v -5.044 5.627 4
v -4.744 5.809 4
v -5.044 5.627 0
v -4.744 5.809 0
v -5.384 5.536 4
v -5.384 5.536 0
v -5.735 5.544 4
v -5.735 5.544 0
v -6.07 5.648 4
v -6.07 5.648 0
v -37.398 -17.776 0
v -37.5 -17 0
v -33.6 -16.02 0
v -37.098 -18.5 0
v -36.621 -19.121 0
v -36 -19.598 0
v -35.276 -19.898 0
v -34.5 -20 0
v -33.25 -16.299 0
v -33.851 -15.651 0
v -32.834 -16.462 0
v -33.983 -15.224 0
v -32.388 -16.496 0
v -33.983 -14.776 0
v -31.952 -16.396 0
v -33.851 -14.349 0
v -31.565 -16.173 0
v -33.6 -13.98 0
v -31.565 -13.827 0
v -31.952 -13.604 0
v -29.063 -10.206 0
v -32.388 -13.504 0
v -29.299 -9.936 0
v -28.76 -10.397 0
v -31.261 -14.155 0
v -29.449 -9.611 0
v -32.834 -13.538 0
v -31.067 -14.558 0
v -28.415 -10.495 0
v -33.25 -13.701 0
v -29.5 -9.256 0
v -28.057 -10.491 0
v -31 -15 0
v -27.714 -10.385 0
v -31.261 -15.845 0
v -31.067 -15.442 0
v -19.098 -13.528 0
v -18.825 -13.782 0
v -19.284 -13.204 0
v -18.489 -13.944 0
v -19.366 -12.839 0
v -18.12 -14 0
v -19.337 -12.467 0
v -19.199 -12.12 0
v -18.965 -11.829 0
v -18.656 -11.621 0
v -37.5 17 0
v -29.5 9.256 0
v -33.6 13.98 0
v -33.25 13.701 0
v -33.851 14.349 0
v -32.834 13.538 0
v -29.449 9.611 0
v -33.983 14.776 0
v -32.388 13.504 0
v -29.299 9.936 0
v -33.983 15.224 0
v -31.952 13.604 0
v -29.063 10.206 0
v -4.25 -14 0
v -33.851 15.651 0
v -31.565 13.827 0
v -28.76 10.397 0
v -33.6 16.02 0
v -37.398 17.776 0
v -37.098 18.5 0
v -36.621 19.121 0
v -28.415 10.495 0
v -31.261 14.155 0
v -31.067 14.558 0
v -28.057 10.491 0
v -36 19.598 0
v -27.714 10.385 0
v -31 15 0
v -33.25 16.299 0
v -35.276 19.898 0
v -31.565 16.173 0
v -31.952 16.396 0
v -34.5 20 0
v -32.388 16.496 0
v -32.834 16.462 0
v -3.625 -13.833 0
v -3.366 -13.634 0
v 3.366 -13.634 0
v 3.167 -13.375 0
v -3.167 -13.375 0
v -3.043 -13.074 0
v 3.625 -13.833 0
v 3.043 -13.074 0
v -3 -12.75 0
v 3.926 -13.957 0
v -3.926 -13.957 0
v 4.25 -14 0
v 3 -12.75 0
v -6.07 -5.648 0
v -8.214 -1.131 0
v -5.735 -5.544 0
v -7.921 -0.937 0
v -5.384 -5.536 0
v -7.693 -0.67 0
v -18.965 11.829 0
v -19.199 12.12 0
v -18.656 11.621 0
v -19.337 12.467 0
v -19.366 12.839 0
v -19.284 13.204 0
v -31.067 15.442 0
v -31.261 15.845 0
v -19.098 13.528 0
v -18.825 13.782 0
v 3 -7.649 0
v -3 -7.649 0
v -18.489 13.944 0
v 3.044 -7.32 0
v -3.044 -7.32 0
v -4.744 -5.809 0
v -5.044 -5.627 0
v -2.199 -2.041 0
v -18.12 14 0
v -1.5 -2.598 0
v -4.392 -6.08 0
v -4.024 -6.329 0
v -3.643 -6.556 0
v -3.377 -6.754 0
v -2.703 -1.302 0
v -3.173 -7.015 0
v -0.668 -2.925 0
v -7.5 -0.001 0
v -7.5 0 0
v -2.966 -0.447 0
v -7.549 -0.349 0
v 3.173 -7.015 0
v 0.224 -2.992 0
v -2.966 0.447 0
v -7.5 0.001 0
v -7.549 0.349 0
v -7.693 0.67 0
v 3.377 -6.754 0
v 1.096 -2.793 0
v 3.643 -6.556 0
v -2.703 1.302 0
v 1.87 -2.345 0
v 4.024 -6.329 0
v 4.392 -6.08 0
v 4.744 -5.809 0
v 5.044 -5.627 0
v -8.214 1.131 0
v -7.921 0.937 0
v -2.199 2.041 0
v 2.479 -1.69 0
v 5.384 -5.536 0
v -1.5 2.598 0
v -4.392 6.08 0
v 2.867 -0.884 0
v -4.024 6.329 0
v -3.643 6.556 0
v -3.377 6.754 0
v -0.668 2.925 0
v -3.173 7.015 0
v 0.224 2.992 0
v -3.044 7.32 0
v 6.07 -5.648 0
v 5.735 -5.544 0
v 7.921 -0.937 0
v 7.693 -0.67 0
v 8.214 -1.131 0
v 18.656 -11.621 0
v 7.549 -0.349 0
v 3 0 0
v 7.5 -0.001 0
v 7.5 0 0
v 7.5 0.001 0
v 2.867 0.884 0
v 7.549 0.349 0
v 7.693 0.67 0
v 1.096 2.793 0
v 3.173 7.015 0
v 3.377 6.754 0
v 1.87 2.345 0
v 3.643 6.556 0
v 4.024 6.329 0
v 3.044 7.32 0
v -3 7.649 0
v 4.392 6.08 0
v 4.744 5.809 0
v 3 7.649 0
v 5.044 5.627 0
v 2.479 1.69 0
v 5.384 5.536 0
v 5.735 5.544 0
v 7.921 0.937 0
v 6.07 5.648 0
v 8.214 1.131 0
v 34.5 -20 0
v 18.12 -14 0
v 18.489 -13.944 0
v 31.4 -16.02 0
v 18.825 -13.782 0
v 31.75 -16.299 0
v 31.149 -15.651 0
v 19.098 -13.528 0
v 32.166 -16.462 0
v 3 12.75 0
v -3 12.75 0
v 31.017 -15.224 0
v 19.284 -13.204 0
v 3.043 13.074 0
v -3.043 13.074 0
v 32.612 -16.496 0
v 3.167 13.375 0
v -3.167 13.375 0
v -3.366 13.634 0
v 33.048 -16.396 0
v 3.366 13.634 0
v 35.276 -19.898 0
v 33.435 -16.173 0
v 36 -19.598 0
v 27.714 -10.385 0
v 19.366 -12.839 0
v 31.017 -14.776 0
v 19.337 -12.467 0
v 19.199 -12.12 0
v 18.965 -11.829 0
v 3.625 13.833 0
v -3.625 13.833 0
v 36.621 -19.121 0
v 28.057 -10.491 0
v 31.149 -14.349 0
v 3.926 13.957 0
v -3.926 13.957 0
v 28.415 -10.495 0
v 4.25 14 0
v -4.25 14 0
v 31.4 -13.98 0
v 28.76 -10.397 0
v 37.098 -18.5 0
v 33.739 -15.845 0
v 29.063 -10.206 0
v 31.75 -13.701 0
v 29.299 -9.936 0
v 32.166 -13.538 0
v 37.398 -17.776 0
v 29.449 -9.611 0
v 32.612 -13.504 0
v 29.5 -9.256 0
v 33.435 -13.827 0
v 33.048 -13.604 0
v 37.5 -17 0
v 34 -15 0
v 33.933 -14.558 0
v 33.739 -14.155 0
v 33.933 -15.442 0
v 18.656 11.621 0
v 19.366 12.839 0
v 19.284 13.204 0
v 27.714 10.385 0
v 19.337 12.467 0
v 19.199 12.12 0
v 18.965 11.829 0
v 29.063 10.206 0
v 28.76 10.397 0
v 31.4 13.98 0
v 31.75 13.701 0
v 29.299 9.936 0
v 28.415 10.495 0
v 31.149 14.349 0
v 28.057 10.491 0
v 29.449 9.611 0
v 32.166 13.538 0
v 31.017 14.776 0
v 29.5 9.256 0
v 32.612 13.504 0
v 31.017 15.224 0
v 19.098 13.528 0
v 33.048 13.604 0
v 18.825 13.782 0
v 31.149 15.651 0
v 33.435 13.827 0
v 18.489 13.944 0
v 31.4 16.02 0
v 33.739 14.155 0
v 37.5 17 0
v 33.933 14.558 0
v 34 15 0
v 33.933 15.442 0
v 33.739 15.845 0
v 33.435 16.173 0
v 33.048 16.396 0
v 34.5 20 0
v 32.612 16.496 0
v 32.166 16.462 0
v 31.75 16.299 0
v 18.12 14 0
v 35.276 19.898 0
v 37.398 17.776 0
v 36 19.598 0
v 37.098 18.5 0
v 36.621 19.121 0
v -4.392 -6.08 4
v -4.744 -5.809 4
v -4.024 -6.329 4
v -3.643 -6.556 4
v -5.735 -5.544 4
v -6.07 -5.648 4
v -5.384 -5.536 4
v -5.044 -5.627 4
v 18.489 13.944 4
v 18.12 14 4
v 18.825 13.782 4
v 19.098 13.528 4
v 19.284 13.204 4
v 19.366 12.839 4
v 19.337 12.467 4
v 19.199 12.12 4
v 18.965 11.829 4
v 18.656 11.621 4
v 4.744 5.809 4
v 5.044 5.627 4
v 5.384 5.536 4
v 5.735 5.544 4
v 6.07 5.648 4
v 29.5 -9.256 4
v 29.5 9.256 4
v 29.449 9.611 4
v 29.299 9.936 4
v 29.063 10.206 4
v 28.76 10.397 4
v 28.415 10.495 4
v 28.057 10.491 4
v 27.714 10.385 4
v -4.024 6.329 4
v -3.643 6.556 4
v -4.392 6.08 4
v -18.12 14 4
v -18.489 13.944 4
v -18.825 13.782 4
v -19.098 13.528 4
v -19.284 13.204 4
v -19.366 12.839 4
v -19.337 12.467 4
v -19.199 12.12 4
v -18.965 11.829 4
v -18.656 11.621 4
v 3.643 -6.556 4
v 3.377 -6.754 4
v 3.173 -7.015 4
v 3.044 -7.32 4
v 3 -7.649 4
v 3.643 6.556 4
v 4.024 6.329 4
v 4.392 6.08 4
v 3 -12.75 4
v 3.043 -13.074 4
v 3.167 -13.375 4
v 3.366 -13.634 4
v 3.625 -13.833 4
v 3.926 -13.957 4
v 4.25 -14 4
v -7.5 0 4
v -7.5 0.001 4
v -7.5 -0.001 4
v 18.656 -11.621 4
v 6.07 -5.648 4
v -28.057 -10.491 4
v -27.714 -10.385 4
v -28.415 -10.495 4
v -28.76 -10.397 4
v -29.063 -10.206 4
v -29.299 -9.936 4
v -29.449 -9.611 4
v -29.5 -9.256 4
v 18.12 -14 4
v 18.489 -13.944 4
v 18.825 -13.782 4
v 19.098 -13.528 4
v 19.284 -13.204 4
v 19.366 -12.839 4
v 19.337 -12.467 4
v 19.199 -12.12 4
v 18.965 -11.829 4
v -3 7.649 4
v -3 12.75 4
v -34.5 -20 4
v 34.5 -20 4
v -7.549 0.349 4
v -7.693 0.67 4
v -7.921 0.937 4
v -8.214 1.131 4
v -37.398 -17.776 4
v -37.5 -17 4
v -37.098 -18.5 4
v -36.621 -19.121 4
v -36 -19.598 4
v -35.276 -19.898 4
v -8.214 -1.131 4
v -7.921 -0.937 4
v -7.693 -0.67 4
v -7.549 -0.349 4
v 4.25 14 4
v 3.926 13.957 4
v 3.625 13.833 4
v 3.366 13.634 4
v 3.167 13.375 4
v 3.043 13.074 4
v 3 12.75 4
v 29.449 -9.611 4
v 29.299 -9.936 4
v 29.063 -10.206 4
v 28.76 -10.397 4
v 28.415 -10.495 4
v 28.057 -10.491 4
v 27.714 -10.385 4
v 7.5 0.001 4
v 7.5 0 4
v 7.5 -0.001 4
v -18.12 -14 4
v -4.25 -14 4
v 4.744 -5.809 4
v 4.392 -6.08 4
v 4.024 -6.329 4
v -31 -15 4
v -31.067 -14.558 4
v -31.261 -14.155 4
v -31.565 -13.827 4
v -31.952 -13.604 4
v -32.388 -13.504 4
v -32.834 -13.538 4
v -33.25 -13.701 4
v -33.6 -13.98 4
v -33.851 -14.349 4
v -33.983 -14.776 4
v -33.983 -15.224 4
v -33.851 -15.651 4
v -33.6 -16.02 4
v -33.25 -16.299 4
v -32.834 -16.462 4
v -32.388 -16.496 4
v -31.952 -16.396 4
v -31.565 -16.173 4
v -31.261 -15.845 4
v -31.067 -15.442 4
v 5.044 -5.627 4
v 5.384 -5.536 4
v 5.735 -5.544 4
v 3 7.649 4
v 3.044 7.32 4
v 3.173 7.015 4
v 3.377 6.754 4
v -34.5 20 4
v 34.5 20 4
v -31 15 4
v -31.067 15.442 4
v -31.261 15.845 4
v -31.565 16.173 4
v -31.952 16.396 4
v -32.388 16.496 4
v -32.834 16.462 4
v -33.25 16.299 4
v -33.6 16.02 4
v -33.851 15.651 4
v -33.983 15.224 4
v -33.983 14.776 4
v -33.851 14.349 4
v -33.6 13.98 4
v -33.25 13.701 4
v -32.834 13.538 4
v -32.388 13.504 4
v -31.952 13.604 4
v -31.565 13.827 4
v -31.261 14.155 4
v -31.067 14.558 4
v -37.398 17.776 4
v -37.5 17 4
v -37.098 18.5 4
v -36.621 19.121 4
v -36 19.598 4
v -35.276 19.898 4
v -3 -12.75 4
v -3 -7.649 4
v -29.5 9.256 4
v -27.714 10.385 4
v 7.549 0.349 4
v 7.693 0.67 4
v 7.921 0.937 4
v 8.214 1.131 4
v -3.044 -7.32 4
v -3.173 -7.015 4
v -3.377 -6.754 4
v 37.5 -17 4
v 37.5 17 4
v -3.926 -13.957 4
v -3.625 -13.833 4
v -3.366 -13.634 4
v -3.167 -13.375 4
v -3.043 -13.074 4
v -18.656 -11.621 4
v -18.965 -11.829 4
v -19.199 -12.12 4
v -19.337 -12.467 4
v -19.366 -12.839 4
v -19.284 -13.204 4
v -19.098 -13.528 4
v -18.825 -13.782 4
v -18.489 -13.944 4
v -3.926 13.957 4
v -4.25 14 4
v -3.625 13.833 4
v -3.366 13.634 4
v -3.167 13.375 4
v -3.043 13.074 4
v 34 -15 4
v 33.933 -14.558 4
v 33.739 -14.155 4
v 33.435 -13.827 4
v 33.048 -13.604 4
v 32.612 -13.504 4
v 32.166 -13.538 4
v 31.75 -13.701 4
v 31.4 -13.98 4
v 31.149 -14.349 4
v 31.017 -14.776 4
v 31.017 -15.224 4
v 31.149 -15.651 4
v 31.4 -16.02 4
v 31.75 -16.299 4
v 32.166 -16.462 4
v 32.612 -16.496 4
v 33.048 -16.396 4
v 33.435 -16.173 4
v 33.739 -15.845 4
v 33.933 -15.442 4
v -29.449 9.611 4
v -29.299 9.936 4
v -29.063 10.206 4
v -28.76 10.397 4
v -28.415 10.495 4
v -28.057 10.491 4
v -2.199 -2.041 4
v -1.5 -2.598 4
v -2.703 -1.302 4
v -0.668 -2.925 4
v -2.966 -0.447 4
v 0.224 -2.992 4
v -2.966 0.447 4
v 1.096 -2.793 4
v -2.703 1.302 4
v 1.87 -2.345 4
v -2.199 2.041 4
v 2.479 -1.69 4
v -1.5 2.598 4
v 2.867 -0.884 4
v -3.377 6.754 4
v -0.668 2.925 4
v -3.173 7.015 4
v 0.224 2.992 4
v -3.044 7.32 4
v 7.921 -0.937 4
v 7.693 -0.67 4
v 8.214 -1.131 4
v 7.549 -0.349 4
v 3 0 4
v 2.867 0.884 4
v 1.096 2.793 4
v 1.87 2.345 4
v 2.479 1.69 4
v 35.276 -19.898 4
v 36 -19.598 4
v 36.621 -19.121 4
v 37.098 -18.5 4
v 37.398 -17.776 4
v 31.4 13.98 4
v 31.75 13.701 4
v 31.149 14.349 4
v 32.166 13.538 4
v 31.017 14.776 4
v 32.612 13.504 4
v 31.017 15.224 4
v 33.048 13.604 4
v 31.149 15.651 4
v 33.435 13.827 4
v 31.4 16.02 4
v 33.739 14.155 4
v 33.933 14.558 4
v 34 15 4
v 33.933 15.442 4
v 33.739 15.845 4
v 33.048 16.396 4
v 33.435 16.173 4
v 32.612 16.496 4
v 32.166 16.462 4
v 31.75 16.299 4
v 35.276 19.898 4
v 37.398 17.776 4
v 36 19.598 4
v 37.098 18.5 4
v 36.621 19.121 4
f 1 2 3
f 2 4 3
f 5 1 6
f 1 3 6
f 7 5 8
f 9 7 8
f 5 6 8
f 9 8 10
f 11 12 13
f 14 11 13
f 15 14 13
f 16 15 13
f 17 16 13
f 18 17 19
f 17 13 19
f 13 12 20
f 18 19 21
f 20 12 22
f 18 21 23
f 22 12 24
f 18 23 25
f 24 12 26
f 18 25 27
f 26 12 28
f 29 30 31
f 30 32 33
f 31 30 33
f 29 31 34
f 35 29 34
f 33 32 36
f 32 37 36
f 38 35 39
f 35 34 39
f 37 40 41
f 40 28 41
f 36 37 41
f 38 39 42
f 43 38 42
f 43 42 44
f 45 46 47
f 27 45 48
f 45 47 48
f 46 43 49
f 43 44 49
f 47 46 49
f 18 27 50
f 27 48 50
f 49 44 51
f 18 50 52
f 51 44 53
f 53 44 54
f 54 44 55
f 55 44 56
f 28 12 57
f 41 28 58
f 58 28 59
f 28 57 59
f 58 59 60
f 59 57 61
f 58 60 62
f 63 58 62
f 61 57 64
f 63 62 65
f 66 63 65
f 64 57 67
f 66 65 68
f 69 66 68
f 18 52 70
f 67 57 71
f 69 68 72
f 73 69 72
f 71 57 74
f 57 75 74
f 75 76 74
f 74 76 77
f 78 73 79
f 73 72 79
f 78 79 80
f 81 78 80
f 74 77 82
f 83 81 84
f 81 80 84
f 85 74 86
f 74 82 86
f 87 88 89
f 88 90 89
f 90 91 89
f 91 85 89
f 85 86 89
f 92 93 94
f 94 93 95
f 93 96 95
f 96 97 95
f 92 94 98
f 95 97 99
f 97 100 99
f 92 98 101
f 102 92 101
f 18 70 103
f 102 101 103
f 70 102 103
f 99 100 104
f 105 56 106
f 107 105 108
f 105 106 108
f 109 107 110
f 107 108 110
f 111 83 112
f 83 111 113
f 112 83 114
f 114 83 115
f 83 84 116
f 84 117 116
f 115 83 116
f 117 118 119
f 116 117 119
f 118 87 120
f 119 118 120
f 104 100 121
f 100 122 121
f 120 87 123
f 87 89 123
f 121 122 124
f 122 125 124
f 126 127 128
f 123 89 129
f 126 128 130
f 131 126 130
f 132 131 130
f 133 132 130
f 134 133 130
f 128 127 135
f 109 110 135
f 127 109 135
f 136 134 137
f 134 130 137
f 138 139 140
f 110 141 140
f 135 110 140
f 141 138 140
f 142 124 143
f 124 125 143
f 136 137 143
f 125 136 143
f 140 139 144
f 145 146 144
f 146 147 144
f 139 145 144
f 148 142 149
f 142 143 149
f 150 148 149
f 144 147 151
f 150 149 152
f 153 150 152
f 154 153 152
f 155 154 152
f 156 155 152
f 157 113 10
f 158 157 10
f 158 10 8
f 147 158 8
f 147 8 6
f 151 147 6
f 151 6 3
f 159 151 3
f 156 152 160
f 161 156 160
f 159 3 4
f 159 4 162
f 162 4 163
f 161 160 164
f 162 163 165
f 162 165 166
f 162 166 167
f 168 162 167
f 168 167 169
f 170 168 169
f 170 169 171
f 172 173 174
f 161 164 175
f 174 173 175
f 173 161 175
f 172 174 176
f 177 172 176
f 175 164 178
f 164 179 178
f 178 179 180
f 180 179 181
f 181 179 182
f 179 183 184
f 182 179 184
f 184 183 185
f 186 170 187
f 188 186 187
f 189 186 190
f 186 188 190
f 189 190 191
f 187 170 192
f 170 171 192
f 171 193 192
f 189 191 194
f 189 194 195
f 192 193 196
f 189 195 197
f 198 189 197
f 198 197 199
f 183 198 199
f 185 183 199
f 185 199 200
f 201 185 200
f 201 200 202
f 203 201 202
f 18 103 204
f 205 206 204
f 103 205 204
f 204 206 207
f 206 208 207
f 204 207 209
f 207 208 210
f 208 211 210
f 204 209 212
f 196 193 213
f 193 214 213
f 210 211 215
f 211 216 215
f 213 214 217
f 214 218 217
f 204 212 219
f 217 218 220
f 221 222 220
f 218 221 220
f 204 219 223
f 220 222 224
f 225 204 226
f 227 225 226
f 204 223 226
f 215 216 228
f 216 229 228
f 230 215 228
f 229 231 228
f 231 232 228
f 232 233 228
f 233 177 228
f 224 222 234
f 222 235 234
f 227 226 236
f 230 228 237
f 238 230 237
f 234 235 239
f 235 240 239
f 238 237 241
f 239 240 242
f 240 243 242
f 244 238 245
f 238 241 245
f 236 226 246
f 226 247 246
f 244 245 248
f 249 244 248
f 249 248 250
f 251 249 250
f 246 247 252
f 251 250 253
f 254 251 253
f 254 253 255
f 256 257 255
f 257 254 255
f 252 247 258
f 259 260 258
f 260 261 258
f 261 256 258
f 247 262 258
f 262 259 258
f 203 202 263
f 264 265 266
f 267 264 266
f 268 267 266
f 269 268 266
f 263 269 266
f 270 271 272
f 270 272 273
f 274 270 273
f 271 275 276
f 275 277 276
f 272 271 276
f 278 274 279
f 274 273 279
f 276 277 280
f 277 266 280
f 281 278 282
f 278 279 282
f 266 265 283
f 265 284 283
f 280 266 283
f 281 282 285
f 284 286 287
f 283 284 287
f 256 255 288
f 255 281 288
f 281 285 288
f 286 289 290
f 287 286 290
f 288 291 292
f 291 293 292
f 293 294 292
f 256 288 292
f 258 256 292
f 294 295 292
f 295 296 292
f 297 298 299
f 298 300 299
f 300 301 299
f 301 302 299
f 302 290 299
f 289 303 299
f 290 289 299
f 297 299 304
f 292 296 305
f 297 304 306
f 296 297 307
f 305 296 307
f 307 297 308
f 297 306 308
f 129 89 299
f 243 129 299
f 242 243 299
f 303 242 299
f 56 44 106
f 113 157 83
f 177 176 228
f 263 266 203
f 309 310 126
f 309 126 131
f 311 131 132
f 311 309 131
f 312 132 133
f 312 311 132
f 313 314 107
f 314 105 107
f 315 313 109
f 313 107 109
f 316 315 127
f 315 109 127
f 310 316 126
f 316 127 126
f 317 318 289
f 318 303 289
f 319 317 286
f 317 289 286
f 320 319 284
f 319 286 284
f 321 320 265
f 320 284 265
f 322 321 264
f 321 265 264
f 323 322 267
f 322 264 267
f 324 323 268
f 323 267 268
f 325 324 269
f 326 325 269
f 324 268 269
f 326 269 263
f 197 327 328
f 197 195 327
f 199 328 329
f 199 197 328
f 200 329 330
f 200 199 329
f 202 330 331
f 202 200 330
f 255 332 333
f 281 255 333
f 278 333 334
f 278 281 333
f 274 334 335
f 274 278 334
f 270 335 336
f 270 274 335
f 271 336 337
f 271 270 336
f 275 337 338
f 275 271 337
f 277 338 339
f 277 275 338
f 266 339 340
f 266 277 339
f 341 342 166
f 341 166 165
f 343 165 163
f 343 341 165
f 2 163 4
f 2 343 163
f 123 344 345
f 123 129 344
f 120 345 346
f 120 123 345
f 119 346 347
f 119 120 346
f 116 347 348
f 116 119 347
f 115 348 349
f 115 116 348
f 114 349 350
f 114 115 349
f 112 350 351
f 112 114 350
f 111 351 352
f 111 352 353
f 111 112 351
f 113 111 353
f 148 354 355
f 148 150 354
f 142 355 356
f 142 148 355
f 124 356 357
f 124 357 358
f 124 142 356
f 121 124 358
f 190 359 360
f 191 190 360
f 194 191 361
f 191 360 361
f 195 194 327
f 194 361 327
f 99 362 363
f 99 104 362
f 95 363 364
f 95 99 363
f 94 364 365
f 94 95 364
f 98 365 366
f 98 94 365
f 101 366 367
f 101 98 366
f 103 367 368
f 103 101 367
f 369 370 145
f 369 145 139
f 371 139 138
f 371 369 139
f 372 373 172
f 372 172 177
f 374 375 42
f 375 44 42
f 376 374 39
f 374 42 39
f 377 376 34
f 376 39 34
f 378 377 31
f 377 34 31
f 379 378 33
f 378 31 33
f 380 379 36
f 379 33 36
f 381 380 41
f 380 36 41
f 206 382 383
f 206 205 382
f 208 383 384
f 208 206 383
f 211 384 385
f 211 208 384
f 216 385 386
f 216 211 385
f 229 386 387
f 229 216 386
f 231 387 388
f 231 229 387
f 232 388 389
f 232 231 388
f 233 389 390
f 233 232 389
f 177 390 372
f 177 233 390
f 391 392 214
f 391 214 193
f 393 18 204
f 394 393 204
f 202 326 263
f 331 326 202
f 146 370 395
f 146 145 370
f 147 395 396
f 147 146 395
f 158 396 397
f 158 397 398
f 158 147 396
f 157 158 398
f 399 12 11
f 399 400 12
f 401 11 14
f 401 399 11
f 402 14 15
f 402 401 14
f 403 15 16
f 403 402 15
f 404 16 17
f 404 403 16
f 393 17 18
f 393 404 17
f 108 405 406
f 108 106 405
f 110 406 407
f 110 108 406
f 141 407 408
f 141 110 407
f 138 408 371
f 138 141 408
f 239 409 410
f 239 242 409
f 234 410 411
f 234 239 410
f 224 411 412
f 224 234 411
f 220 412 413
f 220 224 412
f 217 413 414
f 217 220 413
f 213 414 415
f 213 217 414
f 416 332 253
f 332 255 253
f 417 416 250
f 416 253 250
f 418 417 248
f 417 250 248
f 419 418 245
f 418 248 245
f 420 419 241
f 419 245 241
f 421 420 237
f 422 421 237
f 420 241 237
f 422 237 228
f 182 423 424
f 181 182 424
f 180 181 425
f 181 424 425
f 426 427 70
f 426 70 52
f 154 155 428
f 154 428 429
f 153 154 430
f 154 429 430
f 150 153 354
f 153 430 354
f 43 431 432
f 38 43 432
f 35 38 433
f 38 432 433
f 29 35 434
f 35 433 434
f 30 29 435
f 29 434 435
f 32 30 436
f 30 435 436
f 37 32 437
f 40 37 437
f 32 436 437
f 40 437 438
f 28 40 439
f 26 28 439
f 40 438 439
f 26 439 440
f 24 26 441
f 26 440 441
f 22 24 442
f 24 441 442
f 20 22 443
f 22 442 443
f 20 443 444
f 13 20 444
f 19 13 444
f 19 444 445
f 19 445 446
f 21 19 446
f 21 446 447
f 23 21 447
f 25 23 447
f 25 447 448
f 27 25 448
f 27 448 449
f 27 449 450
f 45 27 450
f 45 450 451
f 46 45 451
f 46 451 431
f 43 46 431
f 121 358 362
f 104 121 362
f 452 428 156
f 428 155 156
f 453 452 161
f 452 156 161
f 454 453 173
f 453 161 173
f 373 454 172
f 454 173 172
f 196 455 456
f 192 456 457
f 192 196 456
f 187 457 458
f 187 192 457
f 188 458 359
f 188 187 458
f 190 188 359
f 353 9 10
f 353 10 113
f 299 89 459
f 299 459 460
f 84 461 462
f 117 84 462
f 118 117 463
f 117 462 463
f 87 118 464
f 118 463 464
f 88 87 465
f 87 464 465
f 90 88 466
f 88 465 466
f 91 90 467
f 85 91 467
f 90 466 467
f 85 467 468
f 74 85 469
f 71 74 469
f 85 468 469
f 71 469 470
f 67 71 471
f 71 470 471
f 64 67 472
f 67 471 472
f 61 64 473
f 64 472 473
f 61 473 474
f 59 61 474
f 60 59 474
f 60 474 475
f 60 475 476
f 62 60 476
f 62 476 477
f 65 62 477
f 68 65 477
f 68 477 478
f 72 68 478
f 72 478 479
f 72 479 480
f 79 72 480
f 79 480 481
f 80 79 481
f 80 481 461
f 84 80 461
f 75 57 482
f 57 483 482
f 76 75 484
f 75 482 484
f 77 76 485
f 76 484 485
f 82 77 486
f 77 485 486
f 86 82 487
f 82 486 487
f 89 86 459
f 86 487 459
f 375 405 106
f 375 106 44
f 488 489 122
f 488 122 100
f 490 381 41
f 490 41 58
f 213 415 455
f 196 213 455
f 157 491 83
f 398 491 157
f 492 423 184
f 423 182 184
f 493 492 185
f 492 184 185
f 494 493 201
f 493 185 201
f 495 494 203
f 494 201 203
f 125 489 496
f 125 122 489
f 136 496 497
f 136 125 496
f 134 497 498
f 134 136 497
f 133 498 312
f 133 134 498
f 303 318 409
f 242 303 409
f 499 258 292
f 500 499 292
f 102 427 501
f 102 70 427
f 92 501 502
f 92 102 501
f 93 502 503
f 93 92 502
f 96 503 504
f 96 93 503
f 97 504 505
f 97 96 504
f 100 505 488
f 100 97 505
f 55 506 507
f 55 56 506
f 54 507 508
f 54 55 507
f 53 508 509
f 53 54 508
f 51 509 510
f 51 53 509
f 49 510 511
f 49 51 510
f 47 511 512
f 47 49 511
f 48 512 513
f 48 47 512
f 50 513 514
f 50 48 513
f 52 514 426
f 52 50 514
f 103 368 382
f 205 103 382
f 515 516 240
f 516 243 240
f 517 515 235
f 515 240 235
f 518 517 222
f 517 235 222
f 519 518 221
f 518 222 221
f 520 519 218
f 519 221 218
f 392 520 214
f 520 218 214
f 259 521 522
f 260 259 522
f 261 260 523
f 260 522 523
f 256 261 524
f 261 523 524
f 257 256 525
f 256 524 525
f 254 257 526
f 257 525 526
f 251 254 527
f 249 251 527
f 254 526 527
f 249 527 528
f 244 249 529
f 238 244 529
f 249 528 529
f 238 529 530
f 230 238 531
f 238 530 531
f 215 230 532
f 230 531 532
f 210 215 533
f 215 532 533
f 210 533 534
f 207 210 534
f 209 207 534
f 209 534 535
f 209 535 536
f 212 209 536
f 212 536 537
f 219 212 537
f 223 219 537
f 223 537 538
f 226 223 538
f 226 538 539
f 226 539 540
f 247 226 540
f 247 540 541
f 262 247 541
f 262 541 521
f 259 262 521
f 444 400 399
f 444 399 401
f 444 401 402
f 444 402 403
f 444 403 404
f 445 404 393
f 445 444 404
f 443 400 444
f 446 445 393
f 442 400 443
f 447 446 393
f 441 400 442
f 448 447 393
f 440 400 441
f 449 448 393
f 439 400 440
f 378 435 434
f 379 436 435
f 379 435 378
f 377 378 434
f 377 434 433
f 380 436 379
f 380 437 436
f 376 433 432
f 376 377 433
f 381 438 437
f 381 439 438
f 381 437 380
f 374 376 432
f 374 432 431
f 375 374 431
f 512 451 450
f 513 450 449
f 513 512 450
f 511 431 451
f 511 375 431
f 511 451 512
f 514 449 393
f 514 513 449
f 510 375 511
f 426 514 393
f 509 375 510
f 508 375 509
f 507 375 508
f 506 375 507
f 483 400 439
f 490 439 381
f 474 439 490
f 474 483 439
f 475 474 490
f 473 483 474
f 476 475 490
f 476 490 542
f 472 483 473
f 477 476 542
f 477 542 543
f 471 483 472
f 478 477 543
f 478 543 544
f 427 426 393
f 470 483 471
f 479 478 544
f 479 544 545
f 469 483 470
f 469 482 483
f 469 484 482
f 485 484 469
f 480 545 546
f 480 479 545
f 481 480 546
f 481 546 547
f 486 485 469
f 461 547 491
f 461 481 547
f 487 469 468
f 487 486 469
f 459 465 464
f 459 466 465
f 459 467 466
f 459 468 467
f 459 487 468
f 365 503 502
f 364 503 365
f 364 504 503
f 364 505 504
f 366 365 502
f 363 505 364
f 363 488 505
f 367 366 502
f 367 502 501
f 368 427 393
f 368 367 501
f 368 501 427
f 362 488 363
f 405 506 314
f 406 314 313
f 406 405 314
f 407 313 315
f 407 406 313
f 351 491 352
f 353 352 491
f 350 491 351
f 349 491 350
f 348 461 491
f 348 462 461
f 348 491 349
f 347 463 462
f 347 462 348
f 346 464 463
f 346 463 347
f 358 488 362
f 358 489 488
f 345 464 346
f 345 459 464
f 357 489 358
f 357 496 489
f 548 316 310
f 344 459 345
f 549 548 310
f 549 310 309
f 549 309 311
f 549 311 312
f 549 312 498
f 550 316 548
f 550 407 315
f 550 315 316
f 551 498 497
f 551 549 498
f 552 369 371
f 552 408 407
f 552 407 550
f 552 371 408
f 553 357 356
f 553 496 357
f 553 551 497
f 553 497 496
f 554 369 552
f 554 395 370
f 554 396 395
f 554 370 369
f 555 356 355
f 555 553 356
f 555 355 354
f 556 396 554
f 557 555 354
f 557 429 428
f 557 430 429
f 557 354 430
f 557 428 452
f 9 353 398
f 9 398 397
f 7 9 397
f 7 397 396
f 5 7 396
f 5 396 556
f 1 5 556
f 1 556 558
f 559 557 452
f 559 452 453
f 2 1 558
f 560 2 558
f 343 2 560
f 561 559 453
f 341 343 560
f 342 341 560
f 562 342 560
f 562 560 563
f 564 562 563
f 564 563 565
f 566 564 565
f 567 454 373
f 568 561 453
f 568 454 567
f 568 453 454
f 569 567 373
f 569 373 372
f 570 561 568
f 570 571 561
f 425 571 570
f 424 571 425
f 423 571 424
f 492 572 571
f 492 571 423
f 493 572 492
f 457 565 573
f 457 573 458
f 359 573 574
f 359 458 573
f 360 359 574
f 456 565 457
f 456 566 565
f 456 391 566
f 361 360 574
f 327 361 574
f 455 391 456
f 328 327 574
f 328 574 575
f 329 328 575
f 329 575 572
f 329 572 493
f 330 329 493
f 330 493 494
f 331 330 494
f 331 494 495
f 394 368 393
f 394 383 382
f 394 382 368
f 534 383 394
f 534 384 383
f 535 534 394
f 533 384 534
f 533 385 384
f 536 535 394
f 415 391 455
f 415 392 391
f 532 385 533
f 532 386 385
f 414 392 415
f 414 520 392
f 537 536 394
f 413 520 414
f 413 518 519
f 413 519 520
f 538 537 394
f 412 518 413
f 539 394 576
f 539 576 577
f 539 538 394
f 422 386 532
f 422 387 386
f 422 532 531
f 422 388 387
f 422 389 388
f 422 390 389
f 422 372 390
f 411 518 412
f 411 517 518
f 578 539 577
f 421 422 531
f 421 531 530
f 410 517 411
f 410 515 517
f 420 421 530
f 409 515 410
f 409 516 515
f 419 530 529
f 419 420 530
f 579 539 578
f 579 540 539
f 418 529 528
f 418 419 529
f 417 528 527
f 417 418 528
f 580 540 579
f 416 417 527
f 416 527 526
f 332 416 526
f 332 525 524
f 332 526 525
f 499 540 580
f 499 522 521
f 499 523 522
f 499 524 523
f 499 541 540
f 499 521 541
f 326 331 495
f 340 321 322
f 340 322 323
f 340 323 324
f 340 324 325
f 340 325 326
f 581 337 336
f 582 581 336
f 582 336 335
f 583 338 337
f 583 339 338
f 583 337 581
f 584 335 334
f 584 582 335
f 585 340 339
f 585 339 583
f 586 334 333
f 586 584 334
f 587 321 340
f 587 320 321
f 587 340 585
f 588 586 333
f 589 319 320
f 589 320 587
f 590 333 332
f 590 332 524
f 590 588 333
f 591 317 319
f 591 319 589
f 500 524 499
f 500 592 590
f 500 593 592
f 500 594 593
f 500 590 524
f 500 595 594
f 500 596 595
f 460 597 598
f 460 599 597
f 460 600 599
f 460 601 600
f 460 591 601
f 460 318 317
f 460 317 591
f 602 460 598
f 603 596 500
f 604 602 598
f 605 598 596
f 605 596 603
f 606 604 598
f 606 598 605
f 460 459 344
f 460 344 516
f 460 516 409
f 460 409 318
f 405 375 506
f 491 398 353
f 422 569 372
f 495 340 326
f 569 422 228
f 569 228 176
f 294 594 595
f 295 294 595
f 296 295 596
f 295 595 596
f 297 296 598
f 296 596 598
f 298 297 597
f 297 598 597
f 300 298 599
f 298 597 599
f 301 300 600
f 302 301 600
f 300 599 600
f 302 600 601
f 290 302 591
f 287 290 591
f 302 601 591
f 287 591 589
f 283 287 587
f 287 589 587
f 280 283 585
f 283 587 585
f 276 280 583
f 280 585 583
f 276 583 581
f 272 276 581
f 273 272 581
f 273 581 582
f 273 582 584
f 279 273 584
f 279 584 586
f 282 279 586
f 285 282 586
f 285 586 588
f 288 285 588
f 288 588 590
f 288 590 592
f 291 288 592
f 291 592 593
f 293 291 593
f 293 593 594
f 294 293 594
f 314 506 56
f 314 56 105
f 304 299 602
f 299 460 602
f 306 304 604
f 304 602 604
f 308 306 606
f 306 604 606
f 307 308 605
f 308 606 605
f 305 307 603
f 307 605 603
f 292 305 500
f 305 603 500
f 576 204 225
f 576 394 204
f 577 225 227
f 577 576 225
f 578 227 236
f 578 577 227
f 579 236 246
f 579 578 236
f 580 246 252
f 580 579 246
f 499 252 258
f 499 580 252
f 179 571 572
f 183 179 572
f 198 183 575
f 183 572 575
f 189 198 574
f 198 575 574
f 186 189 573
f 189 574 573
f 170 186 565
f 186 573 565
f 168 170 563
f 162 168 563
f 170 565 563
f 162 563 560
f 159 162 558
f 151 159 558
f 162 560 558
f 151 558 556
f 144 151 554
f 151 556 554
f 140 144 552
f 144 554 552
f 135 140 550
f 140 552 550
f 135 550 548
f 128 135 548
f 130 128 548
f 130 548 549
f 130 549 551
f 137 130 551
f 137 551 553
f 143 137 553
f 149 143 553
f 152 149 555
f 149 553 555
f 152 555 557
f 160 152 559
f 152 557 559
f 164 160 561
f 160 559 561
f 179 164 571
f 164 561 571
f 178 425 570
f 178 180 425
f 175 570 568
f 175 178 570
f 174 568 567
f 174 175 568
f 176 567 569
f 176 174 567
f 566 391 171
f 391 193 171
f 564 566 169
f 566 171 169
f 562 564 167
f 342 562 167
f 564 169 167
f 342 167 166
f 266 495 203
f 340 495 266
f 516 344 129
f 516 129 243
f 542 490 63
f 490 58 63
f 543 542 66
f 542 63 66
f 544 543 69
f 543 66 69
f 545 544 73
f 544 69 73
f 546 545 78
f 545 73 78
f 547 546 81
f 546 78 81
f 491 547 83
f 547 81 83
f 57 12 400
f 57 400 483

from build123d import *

# Parameters (mm, degrees)
SKETCH_1_W          = 75
SKETCH_1_H          = 40
EXTRUDE_1_DEPTH     = 4
SKETCH_3_R          = 3
CUT_EXTRUDE_1_DEPTH = 4
SKETCH_4_R          = 1.5
CUT_EXTRUDE_2_DEPTH = 10
FILLET_1_R          = 3
CUT_EXTRUDE_3_DEPTH = 10
EXTRUDE_2_DEPTH     = 4
FILLET_2_R          = 1.25


with BuildPart() as part:
    # 草图1 → 凸台-拉伸1 (new body)
    with BuildSketch(Plane.XY):
        Rectangle(SKETCH_1_W, SKETCH_1_H)
    extrude(amount=EXTRUDE_1_DEPTH)

    # 草图3 → 切除-拉伸1 (cut)
    with BuildSketch(Plane.XY.offset(4)):
        Circle(SKETCH_3_R)
    extrude(amount=-CUT_EXTRUDE_1_DEPTH, mode=Mode.SUBTRACT)

    # 草图4 → 切除-拉伸2 (cut)
    with BuildSketch(Plane.XY.offset(4)):
        with Locations((32.5, 15)):
            Circle(SKETCH_4_R)
        with Locations((-32.5, 15)):
            Circle(SKETCH_4_R)
        with Locations((-32.5, -15)):
            Circle(SKETCH_4_R)
        with Locations((32.5, -15)):
            Circle(SKETCH_4_R)
    extrude(amount=-CUT_EXTRUDE_2_DEPTH, mode=Mode.SUBTRACT)

    # 圆角1
    fillet_1_edges = [part.edges().sort_by_distance(p)[0] for p in [
        (37.5, -20, 2),
        (-37.5, -20, 2),
        (-37.5, 20, 2),
        (37.5, 20, 2),
    ]]
    fillet(fillet_1_edges, radius=FILLET_1_R)

    # 草图5 → 切除-拉伸3 (cut)
    with BuildSketch(Plane.XY.offset(4)):
        with BuildLine():
            Line((-29.5, 14), (-3, 14))
            Line((-3, 14), (-3, 6.873863542))
            ThreePointArc((-3, 6.873863542), (-7.5, 0), (-3, -6.873863542))
            Line((-3, -6.873863542), (-3, -14))
            Line((-3, -14), (-29.5, -14))
            Line((-29.5, -14), (-29.5, 14))
        make_face()
    cut_extrude_3 = extrude(amount=-CUT_EXTRUDE_3_DEPTH, mode=Mode.SUBTRACT)

    # 镜向1: 切除-拉伸3 across plane
    add(cut_extrude_3.mirror(Plane(origin=(0, 0, 0), x_dir=(0, 0, 1), z_dir=(1, 0, 0))), mode=Mode.SUBTRACT)

    # 草图6 → 凸台-拉伸2 (add)
    with BuildSketch(Plane.XY.offset(4)):
        with BuildLine():
            Line((-7.460046298, -0.773116571), (-29.5, -11.232755616))
            Line((-29.5, -11.232755616), (-29.5, -14))
            Line((-29.5, -14), (-23.669020762, -14))
            Line((-23.669020762, -14), (-5.316324036, -5.290245622))
            ThreePointArc((-5.316324036, -5.290245622), (-6.775693577, -3.215583392), (-7.460046298, -0.773116571))
        make_face()
        with BuildLine():
            Line((-29.5, 14), (-29.5, 11.232755616))
            Line((-29.5, 11.232755616), (-7.460046298, 0.773116571))
            ThreePointArc((-7.460046298, 0.773116571), (-6.775693577, 3.215583392), (-5.316324036, 5.290245622))
            Line((-5.316324036, 5.290245622), (-23.669020762, 14))
            Line((-23.669020762, 14), (-29.5, 14))
        make_face()
        with BuildLine():
            Line((23.669020762, 14), (5.316324036, 5.290245622))
            ThreePointArc((5.316324036, 5.290245622), (6.775693577, 3.215583392), (7.460046298, 0.773116571))
            Line((7.460046298, 0.773116571), (29.5, 11.232755616))
            Line((29.5, 11.232755616), (29.5, 14))
            Line((29.5, 14), (23.669020762, 14))
        make_face()
        with BuildLine():
            ThreePointArc((7.460046298, -0.773116571), (6.775693577, -3.215583392), (5.316324036, -5.290245622))
            Line((5.316324036, -5.290245622), (23.669020762, -14))
            Line((23.669020762, -14), (29.5, -14))
            Line((29.5, -14), (29.5, -11.232755616))
            Line((29.5, -11.232755616), (7.460046298, -0.773116571))
        make_face()
    extrude(amount=-EXTRUDE_2_DEPTH)

    # 圆角2
    fillet_2_edges = [part.edges().sort_by_distance(p)[0] for p in [
        (3, -14, 2),
        (3, -6.873863542, 2),
        (3, 6.873863542, 2),
        (3, 14, 2),
        (-29.5, -11.232755616, 2),
        (-7.460046298, -0.773116571, 2),
        (-5.316324036, -5.290245622, 2),
        (-23.669020762, -14, 2),
        (-23.669020762, 14, 2),
        (-5.316324036, 5.290245622, 2),
        (-7.460046298, 0.773116571, 2),
        (-29.5, 11.232755616, 2),
        (5.316324036, 5.290245622, 2),
        (23.669020762, 14, 2),
        (29.5, 11.232755616, 2),
        (7.460046298, 0.773116571, 2),
        (7.460046298, -0.773116571, 2),
        (29.5, -11.232755616, 2),
        (23.669020762, -14, 2),
        (5.316324036, -5.290245622, 2),
        (-3, 14, 2),
        (-3, 6.873863542, 2),
        (-3, -6.873863542, 2),
        (-3, -14, 2),
    ]]
    fillet(fillet_2_edges, radius=FILLET_2_R)


solid = part.part
